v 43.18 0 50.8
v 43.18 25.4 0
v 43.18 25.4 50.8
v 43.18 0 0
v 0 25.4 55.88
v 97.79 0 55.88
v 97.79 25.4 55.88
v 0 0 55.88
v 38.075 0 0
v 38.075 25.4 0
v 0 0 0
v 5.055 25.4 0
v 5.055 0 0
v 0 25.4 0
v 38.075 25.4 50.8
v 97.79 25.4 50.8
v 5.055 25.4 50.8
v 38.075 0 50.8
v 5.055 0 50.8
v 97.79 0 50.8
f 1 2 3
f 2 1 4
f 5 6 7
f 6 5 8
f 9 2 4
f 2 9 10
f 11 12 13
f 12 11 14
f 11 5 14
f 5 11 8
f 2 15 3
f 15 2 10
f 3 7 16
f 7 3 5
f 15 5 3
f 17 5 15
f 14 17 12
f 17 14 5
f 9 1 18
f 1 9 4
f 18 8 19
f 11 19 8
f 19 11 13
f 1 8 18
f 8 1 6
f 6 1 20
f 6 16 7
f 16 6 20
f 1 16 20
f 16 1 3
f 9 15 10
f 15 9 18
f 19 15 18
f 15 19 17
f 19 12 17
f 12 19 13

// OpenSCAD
//Sink Middle Bar Extender
//BEGIN CUSTOMIZER VARIABLES
/*[Bar]*/
width_of_bar = 1.3;
thickness = .2;
depth_of_slot = 2;
/*[Extender]*/
length_of_extender = 3;
width_of_extender= 1;
//END CUSTOMIZER VARIABLES
/*[Hidden]*/
unitConversion =25.4;

theThing();

module theThing(){
  difference(){
    union(){
      cube([width_of_bar+thickness*2, width_of_extender,depth_of_slot+thickness]*unitConversion);
      translate([width_of_bar/2+thickness,0,depth_of_slot]*unitConversion){
        cube([length_of_extender,width_of_extender,thickness]*unitConversion);
      }
    }
    translate([thickness-.001,0,0]*unitConversion){
      cube([width_of_bar, width_of_extender+.1, depth_of_slot]*unitConversion);
    }
  }
}
